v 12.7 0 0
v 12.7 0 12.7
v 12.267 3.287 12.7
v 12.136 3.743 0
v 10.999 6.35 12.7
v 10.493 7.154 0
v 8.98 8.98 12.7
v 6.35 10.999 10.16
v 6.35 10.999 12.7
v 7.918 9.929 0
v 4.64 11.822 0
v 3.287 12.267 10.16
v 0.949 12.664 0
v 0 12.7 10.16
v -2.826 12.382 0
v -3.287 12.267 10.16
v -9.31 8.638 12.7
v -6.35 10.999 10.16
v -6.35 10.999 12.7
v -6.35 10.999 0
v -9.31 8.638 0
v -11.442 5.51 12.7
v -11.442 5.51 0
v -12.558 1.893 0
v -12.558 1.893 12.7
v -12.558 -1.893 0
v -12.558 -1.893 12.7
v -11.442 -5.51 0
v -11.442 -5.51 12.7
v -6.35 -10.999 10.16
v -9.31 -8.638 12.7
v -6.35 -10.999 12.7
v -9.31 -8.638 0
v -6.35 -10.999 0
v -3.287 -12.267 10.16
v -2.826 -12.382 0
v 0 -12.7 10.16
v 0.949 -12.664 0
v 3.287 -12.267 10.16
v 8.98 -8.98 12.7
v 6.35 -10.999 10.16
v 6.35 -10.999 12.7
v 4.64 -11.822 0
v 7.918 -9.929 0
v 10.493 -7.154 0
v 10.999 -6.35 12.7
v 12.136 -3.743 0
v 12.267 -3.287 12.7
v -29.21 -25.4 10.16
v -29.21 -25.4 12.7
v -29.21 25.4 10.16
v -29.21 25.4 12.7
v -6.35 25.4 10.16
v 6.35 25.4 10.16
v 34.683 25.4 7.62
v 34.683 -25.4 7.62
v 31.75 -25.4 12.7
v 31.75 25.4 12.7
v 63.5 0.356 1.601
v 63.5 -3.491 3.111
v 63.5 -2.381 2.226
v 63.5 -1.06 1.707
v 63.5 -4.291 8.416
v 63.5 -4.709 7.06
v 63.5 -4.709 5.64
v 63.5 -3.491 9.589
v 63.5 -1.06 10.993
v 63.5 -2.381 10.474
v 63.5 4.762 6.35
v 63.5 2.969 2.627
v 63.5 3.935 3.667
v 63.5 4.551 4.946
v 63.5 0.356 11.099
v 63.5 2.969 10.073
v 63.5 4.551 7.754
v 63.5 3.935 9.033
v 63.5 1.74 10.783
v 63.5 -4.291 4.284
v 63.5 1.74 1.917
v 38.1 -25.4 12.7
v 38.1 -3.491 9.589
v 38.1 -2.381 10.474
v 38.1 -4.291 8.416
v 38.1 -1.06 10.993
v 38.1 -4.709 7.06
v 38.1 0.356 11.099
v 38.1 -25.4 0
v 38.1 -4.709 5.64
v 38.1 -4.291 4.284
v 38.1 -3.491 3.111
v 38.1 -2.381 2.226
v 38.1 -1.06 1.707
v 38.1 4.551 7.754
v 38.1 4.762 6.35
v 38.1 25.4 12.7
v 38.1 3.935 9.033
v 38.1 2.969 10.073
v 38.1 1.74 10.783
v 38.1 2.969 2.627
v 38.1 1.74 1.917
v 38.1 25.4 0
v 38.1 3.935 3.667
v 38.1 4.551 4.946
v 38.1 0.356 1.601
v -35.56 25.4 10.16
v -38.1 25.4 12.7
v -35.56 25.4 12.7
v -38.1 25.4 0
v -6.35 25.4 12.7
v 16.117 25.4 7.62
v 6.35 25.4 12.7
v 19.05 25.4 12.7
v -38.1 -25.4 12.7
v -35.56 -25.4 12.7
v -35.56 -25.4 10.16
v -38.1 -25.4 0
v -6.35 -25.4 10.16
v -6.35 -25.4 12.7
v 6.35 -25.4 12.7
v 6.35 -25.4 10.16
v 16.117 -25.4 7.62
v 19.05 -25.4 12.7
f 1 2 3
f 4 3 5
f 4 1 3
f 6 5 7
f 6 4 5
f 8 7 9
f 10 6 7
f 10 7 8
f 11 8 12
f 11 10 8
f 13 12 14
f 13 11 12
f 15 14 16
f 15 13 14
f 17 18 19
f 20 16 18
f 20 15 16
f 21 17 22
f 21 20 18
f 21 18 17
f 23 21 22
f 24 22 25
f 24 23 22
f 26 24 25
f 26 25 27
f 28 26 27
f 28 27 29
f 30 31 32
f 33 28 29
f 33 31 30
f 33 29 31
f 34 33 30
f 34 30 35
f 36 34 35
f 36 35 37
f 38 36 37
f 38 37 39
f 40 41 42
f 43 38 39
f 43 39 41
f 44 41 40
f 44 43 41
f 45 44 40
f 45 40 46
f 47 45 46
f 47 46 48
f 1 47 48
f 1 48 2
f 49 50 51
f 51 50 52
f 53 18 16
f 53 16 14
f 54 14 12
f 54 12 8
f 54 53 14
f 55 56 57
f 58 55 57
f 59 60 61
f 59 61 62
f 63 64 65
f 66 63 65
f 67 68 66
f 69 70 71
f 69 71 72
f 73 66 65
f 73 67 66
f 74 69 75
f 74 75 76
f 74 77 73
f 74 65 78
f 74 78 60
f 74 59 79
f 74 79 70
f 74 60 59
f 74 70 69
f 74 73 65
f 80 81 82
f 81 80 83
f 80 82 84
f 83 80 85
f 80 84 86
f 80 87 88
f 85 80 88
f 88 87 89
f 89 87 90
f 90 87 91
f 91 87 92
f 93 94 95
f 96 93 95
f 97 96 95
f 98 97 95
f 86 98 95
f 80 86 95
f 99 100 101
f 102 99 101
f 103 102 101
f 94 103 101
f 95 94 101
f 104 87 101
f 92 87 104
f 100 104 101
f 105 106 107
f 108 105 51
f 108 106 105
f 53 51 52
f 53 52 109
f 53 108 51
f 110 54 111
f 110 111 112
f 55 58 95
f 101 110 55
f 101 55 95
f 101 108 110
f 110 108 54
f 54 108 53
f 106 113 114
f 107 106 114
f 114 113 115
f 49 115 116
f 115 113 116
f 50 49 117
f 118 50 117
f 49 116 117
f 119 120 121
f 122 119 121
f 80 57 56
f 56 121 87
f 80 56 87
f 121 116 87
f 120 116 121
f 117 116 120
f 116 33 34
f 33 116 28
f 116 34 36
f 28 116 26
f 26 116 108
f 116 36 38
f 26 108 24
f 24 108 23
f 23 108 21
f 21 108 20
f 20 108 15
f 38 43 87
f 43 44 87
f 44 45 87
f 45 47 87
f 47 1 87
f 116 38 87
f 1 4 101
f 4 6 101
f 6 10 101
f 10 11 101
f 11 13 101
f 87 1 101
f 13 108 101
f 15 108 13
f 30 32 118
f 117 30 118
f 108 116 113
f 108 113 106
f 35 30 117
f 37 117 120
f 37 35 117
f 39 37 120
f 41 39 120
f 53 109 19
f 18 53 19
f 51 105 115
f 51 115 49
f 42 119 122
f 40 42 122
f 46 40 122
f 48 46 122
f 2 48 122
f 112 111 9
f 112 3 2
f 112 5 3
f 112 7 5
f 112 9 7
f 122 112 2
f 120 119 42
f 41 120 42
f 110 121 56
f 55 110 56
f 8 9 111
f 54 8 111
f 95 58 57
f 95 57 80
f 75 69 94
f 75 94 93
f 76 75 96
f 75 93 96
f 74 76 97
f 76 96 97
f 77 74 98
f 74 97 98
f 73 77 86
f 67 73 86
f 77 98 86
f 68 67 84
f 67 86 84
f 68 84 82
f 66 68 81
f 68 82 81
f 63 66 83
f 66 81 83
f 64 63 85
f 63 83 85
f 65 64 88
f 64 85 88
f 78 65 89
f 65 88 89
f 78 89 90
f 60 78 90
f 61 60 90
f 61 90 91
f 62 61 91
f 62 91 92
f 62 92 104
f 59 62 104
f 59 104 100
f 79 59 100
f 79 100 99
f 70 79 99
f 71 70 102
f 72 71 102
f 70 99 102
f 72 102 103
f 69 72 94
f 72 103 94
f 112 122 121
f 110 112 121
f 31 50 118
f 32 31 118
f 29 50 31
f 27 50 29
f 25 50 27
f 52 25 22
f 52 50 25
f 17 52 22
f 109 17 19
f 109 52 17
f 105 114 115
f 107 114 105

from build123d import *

# Parameters (mm, degrees)
F0_W     = 76.2
F0_H     = 50.8
F0_R     = 12.7
F1_DEPTH = 12.7
F2_W     = 6.35
F2_H     = 50.8
F3_DEPTH = 2.54
F5_DEPTH = 50.801
F6_R     = 4.7625
F7_DEPTH = 25.4


with BuildPart() as f1:
    # F0 (on Top) → F1 (new body)
    with BuildSketch(Plane.XY):
        Rectangle(F0_W, F0_H)
        Circle(F0_R, mode=Mode.SUBTRACT)
    extrude(amount=F1_DEPTH)

    # F2 (on face) → F3 (cut)
    with BuildSketch(Plane.XY.offset(12.7)):
        with Locations((-32.385, 0)):
            Rectangle(F2_W, F2_H)
        with BuildLine():
            Line((6.35, 25.4), (-6.35, 25.4))
            Line((-6.35, 25.4), (-6.35, 10.9985226281))
            ThreePointArc((-6.35, 10.9985226281), (0, 12.7), (6.35, 10.9985226281))
            Line((6.35, 10.9985226281), (6.35, 25.4))
        make_face()
        with BuildLine():
            ThreePointArc((6.35, 10.9985226281), (0, 12.7), (-6.35, 10.9985226281))
            Line((-6.35, 10.9985226281), (-6.35, -10.9985226281))
            ThreePointArc((-6.35, -10.9985226281), (0, -12.7), (6.35, -10.9985226281))
            Line((6.35, -10.9985226281), (6.35, 10.9985226281))
        make_face()
        with BuildLine():
            Line((-6.35, -10.9985226281), (-6.35, -25.4))
            Line((-6.35, -25.4), (6.35, -25.4))
            Line((6.35, -25.4), (6.35, -10.9985226281))
            ThreePointArc((6.35, -10.9985226281), (0, -12.7), (-6.35, -10.9985226281))
        make_face()
    extrude(amount=-F3_DEPTH, mode=Mode.SUBTRACT)

    # F4 (on face) → F5 (cut, through all)
    with BuildSketch(Plane.XZ.offset(25.4)):
        Polygon((31.75, 12.7), (19.05, 12.7), (16.1170606325, 7.62), (34.6829393675, 7.62), align=None)
    extrude(amount=-F5_DEPTH, mode=Mode.SUBTRACT)

    # F6 (on face) → F7 (join)
    with BuildSketch(Plane.YZ.offset(38.1)):
        with Locations((0, 6.35)):
            Circle(F6_R)
    extrude(amount=F7_DEPTH)


solid = f1.part
